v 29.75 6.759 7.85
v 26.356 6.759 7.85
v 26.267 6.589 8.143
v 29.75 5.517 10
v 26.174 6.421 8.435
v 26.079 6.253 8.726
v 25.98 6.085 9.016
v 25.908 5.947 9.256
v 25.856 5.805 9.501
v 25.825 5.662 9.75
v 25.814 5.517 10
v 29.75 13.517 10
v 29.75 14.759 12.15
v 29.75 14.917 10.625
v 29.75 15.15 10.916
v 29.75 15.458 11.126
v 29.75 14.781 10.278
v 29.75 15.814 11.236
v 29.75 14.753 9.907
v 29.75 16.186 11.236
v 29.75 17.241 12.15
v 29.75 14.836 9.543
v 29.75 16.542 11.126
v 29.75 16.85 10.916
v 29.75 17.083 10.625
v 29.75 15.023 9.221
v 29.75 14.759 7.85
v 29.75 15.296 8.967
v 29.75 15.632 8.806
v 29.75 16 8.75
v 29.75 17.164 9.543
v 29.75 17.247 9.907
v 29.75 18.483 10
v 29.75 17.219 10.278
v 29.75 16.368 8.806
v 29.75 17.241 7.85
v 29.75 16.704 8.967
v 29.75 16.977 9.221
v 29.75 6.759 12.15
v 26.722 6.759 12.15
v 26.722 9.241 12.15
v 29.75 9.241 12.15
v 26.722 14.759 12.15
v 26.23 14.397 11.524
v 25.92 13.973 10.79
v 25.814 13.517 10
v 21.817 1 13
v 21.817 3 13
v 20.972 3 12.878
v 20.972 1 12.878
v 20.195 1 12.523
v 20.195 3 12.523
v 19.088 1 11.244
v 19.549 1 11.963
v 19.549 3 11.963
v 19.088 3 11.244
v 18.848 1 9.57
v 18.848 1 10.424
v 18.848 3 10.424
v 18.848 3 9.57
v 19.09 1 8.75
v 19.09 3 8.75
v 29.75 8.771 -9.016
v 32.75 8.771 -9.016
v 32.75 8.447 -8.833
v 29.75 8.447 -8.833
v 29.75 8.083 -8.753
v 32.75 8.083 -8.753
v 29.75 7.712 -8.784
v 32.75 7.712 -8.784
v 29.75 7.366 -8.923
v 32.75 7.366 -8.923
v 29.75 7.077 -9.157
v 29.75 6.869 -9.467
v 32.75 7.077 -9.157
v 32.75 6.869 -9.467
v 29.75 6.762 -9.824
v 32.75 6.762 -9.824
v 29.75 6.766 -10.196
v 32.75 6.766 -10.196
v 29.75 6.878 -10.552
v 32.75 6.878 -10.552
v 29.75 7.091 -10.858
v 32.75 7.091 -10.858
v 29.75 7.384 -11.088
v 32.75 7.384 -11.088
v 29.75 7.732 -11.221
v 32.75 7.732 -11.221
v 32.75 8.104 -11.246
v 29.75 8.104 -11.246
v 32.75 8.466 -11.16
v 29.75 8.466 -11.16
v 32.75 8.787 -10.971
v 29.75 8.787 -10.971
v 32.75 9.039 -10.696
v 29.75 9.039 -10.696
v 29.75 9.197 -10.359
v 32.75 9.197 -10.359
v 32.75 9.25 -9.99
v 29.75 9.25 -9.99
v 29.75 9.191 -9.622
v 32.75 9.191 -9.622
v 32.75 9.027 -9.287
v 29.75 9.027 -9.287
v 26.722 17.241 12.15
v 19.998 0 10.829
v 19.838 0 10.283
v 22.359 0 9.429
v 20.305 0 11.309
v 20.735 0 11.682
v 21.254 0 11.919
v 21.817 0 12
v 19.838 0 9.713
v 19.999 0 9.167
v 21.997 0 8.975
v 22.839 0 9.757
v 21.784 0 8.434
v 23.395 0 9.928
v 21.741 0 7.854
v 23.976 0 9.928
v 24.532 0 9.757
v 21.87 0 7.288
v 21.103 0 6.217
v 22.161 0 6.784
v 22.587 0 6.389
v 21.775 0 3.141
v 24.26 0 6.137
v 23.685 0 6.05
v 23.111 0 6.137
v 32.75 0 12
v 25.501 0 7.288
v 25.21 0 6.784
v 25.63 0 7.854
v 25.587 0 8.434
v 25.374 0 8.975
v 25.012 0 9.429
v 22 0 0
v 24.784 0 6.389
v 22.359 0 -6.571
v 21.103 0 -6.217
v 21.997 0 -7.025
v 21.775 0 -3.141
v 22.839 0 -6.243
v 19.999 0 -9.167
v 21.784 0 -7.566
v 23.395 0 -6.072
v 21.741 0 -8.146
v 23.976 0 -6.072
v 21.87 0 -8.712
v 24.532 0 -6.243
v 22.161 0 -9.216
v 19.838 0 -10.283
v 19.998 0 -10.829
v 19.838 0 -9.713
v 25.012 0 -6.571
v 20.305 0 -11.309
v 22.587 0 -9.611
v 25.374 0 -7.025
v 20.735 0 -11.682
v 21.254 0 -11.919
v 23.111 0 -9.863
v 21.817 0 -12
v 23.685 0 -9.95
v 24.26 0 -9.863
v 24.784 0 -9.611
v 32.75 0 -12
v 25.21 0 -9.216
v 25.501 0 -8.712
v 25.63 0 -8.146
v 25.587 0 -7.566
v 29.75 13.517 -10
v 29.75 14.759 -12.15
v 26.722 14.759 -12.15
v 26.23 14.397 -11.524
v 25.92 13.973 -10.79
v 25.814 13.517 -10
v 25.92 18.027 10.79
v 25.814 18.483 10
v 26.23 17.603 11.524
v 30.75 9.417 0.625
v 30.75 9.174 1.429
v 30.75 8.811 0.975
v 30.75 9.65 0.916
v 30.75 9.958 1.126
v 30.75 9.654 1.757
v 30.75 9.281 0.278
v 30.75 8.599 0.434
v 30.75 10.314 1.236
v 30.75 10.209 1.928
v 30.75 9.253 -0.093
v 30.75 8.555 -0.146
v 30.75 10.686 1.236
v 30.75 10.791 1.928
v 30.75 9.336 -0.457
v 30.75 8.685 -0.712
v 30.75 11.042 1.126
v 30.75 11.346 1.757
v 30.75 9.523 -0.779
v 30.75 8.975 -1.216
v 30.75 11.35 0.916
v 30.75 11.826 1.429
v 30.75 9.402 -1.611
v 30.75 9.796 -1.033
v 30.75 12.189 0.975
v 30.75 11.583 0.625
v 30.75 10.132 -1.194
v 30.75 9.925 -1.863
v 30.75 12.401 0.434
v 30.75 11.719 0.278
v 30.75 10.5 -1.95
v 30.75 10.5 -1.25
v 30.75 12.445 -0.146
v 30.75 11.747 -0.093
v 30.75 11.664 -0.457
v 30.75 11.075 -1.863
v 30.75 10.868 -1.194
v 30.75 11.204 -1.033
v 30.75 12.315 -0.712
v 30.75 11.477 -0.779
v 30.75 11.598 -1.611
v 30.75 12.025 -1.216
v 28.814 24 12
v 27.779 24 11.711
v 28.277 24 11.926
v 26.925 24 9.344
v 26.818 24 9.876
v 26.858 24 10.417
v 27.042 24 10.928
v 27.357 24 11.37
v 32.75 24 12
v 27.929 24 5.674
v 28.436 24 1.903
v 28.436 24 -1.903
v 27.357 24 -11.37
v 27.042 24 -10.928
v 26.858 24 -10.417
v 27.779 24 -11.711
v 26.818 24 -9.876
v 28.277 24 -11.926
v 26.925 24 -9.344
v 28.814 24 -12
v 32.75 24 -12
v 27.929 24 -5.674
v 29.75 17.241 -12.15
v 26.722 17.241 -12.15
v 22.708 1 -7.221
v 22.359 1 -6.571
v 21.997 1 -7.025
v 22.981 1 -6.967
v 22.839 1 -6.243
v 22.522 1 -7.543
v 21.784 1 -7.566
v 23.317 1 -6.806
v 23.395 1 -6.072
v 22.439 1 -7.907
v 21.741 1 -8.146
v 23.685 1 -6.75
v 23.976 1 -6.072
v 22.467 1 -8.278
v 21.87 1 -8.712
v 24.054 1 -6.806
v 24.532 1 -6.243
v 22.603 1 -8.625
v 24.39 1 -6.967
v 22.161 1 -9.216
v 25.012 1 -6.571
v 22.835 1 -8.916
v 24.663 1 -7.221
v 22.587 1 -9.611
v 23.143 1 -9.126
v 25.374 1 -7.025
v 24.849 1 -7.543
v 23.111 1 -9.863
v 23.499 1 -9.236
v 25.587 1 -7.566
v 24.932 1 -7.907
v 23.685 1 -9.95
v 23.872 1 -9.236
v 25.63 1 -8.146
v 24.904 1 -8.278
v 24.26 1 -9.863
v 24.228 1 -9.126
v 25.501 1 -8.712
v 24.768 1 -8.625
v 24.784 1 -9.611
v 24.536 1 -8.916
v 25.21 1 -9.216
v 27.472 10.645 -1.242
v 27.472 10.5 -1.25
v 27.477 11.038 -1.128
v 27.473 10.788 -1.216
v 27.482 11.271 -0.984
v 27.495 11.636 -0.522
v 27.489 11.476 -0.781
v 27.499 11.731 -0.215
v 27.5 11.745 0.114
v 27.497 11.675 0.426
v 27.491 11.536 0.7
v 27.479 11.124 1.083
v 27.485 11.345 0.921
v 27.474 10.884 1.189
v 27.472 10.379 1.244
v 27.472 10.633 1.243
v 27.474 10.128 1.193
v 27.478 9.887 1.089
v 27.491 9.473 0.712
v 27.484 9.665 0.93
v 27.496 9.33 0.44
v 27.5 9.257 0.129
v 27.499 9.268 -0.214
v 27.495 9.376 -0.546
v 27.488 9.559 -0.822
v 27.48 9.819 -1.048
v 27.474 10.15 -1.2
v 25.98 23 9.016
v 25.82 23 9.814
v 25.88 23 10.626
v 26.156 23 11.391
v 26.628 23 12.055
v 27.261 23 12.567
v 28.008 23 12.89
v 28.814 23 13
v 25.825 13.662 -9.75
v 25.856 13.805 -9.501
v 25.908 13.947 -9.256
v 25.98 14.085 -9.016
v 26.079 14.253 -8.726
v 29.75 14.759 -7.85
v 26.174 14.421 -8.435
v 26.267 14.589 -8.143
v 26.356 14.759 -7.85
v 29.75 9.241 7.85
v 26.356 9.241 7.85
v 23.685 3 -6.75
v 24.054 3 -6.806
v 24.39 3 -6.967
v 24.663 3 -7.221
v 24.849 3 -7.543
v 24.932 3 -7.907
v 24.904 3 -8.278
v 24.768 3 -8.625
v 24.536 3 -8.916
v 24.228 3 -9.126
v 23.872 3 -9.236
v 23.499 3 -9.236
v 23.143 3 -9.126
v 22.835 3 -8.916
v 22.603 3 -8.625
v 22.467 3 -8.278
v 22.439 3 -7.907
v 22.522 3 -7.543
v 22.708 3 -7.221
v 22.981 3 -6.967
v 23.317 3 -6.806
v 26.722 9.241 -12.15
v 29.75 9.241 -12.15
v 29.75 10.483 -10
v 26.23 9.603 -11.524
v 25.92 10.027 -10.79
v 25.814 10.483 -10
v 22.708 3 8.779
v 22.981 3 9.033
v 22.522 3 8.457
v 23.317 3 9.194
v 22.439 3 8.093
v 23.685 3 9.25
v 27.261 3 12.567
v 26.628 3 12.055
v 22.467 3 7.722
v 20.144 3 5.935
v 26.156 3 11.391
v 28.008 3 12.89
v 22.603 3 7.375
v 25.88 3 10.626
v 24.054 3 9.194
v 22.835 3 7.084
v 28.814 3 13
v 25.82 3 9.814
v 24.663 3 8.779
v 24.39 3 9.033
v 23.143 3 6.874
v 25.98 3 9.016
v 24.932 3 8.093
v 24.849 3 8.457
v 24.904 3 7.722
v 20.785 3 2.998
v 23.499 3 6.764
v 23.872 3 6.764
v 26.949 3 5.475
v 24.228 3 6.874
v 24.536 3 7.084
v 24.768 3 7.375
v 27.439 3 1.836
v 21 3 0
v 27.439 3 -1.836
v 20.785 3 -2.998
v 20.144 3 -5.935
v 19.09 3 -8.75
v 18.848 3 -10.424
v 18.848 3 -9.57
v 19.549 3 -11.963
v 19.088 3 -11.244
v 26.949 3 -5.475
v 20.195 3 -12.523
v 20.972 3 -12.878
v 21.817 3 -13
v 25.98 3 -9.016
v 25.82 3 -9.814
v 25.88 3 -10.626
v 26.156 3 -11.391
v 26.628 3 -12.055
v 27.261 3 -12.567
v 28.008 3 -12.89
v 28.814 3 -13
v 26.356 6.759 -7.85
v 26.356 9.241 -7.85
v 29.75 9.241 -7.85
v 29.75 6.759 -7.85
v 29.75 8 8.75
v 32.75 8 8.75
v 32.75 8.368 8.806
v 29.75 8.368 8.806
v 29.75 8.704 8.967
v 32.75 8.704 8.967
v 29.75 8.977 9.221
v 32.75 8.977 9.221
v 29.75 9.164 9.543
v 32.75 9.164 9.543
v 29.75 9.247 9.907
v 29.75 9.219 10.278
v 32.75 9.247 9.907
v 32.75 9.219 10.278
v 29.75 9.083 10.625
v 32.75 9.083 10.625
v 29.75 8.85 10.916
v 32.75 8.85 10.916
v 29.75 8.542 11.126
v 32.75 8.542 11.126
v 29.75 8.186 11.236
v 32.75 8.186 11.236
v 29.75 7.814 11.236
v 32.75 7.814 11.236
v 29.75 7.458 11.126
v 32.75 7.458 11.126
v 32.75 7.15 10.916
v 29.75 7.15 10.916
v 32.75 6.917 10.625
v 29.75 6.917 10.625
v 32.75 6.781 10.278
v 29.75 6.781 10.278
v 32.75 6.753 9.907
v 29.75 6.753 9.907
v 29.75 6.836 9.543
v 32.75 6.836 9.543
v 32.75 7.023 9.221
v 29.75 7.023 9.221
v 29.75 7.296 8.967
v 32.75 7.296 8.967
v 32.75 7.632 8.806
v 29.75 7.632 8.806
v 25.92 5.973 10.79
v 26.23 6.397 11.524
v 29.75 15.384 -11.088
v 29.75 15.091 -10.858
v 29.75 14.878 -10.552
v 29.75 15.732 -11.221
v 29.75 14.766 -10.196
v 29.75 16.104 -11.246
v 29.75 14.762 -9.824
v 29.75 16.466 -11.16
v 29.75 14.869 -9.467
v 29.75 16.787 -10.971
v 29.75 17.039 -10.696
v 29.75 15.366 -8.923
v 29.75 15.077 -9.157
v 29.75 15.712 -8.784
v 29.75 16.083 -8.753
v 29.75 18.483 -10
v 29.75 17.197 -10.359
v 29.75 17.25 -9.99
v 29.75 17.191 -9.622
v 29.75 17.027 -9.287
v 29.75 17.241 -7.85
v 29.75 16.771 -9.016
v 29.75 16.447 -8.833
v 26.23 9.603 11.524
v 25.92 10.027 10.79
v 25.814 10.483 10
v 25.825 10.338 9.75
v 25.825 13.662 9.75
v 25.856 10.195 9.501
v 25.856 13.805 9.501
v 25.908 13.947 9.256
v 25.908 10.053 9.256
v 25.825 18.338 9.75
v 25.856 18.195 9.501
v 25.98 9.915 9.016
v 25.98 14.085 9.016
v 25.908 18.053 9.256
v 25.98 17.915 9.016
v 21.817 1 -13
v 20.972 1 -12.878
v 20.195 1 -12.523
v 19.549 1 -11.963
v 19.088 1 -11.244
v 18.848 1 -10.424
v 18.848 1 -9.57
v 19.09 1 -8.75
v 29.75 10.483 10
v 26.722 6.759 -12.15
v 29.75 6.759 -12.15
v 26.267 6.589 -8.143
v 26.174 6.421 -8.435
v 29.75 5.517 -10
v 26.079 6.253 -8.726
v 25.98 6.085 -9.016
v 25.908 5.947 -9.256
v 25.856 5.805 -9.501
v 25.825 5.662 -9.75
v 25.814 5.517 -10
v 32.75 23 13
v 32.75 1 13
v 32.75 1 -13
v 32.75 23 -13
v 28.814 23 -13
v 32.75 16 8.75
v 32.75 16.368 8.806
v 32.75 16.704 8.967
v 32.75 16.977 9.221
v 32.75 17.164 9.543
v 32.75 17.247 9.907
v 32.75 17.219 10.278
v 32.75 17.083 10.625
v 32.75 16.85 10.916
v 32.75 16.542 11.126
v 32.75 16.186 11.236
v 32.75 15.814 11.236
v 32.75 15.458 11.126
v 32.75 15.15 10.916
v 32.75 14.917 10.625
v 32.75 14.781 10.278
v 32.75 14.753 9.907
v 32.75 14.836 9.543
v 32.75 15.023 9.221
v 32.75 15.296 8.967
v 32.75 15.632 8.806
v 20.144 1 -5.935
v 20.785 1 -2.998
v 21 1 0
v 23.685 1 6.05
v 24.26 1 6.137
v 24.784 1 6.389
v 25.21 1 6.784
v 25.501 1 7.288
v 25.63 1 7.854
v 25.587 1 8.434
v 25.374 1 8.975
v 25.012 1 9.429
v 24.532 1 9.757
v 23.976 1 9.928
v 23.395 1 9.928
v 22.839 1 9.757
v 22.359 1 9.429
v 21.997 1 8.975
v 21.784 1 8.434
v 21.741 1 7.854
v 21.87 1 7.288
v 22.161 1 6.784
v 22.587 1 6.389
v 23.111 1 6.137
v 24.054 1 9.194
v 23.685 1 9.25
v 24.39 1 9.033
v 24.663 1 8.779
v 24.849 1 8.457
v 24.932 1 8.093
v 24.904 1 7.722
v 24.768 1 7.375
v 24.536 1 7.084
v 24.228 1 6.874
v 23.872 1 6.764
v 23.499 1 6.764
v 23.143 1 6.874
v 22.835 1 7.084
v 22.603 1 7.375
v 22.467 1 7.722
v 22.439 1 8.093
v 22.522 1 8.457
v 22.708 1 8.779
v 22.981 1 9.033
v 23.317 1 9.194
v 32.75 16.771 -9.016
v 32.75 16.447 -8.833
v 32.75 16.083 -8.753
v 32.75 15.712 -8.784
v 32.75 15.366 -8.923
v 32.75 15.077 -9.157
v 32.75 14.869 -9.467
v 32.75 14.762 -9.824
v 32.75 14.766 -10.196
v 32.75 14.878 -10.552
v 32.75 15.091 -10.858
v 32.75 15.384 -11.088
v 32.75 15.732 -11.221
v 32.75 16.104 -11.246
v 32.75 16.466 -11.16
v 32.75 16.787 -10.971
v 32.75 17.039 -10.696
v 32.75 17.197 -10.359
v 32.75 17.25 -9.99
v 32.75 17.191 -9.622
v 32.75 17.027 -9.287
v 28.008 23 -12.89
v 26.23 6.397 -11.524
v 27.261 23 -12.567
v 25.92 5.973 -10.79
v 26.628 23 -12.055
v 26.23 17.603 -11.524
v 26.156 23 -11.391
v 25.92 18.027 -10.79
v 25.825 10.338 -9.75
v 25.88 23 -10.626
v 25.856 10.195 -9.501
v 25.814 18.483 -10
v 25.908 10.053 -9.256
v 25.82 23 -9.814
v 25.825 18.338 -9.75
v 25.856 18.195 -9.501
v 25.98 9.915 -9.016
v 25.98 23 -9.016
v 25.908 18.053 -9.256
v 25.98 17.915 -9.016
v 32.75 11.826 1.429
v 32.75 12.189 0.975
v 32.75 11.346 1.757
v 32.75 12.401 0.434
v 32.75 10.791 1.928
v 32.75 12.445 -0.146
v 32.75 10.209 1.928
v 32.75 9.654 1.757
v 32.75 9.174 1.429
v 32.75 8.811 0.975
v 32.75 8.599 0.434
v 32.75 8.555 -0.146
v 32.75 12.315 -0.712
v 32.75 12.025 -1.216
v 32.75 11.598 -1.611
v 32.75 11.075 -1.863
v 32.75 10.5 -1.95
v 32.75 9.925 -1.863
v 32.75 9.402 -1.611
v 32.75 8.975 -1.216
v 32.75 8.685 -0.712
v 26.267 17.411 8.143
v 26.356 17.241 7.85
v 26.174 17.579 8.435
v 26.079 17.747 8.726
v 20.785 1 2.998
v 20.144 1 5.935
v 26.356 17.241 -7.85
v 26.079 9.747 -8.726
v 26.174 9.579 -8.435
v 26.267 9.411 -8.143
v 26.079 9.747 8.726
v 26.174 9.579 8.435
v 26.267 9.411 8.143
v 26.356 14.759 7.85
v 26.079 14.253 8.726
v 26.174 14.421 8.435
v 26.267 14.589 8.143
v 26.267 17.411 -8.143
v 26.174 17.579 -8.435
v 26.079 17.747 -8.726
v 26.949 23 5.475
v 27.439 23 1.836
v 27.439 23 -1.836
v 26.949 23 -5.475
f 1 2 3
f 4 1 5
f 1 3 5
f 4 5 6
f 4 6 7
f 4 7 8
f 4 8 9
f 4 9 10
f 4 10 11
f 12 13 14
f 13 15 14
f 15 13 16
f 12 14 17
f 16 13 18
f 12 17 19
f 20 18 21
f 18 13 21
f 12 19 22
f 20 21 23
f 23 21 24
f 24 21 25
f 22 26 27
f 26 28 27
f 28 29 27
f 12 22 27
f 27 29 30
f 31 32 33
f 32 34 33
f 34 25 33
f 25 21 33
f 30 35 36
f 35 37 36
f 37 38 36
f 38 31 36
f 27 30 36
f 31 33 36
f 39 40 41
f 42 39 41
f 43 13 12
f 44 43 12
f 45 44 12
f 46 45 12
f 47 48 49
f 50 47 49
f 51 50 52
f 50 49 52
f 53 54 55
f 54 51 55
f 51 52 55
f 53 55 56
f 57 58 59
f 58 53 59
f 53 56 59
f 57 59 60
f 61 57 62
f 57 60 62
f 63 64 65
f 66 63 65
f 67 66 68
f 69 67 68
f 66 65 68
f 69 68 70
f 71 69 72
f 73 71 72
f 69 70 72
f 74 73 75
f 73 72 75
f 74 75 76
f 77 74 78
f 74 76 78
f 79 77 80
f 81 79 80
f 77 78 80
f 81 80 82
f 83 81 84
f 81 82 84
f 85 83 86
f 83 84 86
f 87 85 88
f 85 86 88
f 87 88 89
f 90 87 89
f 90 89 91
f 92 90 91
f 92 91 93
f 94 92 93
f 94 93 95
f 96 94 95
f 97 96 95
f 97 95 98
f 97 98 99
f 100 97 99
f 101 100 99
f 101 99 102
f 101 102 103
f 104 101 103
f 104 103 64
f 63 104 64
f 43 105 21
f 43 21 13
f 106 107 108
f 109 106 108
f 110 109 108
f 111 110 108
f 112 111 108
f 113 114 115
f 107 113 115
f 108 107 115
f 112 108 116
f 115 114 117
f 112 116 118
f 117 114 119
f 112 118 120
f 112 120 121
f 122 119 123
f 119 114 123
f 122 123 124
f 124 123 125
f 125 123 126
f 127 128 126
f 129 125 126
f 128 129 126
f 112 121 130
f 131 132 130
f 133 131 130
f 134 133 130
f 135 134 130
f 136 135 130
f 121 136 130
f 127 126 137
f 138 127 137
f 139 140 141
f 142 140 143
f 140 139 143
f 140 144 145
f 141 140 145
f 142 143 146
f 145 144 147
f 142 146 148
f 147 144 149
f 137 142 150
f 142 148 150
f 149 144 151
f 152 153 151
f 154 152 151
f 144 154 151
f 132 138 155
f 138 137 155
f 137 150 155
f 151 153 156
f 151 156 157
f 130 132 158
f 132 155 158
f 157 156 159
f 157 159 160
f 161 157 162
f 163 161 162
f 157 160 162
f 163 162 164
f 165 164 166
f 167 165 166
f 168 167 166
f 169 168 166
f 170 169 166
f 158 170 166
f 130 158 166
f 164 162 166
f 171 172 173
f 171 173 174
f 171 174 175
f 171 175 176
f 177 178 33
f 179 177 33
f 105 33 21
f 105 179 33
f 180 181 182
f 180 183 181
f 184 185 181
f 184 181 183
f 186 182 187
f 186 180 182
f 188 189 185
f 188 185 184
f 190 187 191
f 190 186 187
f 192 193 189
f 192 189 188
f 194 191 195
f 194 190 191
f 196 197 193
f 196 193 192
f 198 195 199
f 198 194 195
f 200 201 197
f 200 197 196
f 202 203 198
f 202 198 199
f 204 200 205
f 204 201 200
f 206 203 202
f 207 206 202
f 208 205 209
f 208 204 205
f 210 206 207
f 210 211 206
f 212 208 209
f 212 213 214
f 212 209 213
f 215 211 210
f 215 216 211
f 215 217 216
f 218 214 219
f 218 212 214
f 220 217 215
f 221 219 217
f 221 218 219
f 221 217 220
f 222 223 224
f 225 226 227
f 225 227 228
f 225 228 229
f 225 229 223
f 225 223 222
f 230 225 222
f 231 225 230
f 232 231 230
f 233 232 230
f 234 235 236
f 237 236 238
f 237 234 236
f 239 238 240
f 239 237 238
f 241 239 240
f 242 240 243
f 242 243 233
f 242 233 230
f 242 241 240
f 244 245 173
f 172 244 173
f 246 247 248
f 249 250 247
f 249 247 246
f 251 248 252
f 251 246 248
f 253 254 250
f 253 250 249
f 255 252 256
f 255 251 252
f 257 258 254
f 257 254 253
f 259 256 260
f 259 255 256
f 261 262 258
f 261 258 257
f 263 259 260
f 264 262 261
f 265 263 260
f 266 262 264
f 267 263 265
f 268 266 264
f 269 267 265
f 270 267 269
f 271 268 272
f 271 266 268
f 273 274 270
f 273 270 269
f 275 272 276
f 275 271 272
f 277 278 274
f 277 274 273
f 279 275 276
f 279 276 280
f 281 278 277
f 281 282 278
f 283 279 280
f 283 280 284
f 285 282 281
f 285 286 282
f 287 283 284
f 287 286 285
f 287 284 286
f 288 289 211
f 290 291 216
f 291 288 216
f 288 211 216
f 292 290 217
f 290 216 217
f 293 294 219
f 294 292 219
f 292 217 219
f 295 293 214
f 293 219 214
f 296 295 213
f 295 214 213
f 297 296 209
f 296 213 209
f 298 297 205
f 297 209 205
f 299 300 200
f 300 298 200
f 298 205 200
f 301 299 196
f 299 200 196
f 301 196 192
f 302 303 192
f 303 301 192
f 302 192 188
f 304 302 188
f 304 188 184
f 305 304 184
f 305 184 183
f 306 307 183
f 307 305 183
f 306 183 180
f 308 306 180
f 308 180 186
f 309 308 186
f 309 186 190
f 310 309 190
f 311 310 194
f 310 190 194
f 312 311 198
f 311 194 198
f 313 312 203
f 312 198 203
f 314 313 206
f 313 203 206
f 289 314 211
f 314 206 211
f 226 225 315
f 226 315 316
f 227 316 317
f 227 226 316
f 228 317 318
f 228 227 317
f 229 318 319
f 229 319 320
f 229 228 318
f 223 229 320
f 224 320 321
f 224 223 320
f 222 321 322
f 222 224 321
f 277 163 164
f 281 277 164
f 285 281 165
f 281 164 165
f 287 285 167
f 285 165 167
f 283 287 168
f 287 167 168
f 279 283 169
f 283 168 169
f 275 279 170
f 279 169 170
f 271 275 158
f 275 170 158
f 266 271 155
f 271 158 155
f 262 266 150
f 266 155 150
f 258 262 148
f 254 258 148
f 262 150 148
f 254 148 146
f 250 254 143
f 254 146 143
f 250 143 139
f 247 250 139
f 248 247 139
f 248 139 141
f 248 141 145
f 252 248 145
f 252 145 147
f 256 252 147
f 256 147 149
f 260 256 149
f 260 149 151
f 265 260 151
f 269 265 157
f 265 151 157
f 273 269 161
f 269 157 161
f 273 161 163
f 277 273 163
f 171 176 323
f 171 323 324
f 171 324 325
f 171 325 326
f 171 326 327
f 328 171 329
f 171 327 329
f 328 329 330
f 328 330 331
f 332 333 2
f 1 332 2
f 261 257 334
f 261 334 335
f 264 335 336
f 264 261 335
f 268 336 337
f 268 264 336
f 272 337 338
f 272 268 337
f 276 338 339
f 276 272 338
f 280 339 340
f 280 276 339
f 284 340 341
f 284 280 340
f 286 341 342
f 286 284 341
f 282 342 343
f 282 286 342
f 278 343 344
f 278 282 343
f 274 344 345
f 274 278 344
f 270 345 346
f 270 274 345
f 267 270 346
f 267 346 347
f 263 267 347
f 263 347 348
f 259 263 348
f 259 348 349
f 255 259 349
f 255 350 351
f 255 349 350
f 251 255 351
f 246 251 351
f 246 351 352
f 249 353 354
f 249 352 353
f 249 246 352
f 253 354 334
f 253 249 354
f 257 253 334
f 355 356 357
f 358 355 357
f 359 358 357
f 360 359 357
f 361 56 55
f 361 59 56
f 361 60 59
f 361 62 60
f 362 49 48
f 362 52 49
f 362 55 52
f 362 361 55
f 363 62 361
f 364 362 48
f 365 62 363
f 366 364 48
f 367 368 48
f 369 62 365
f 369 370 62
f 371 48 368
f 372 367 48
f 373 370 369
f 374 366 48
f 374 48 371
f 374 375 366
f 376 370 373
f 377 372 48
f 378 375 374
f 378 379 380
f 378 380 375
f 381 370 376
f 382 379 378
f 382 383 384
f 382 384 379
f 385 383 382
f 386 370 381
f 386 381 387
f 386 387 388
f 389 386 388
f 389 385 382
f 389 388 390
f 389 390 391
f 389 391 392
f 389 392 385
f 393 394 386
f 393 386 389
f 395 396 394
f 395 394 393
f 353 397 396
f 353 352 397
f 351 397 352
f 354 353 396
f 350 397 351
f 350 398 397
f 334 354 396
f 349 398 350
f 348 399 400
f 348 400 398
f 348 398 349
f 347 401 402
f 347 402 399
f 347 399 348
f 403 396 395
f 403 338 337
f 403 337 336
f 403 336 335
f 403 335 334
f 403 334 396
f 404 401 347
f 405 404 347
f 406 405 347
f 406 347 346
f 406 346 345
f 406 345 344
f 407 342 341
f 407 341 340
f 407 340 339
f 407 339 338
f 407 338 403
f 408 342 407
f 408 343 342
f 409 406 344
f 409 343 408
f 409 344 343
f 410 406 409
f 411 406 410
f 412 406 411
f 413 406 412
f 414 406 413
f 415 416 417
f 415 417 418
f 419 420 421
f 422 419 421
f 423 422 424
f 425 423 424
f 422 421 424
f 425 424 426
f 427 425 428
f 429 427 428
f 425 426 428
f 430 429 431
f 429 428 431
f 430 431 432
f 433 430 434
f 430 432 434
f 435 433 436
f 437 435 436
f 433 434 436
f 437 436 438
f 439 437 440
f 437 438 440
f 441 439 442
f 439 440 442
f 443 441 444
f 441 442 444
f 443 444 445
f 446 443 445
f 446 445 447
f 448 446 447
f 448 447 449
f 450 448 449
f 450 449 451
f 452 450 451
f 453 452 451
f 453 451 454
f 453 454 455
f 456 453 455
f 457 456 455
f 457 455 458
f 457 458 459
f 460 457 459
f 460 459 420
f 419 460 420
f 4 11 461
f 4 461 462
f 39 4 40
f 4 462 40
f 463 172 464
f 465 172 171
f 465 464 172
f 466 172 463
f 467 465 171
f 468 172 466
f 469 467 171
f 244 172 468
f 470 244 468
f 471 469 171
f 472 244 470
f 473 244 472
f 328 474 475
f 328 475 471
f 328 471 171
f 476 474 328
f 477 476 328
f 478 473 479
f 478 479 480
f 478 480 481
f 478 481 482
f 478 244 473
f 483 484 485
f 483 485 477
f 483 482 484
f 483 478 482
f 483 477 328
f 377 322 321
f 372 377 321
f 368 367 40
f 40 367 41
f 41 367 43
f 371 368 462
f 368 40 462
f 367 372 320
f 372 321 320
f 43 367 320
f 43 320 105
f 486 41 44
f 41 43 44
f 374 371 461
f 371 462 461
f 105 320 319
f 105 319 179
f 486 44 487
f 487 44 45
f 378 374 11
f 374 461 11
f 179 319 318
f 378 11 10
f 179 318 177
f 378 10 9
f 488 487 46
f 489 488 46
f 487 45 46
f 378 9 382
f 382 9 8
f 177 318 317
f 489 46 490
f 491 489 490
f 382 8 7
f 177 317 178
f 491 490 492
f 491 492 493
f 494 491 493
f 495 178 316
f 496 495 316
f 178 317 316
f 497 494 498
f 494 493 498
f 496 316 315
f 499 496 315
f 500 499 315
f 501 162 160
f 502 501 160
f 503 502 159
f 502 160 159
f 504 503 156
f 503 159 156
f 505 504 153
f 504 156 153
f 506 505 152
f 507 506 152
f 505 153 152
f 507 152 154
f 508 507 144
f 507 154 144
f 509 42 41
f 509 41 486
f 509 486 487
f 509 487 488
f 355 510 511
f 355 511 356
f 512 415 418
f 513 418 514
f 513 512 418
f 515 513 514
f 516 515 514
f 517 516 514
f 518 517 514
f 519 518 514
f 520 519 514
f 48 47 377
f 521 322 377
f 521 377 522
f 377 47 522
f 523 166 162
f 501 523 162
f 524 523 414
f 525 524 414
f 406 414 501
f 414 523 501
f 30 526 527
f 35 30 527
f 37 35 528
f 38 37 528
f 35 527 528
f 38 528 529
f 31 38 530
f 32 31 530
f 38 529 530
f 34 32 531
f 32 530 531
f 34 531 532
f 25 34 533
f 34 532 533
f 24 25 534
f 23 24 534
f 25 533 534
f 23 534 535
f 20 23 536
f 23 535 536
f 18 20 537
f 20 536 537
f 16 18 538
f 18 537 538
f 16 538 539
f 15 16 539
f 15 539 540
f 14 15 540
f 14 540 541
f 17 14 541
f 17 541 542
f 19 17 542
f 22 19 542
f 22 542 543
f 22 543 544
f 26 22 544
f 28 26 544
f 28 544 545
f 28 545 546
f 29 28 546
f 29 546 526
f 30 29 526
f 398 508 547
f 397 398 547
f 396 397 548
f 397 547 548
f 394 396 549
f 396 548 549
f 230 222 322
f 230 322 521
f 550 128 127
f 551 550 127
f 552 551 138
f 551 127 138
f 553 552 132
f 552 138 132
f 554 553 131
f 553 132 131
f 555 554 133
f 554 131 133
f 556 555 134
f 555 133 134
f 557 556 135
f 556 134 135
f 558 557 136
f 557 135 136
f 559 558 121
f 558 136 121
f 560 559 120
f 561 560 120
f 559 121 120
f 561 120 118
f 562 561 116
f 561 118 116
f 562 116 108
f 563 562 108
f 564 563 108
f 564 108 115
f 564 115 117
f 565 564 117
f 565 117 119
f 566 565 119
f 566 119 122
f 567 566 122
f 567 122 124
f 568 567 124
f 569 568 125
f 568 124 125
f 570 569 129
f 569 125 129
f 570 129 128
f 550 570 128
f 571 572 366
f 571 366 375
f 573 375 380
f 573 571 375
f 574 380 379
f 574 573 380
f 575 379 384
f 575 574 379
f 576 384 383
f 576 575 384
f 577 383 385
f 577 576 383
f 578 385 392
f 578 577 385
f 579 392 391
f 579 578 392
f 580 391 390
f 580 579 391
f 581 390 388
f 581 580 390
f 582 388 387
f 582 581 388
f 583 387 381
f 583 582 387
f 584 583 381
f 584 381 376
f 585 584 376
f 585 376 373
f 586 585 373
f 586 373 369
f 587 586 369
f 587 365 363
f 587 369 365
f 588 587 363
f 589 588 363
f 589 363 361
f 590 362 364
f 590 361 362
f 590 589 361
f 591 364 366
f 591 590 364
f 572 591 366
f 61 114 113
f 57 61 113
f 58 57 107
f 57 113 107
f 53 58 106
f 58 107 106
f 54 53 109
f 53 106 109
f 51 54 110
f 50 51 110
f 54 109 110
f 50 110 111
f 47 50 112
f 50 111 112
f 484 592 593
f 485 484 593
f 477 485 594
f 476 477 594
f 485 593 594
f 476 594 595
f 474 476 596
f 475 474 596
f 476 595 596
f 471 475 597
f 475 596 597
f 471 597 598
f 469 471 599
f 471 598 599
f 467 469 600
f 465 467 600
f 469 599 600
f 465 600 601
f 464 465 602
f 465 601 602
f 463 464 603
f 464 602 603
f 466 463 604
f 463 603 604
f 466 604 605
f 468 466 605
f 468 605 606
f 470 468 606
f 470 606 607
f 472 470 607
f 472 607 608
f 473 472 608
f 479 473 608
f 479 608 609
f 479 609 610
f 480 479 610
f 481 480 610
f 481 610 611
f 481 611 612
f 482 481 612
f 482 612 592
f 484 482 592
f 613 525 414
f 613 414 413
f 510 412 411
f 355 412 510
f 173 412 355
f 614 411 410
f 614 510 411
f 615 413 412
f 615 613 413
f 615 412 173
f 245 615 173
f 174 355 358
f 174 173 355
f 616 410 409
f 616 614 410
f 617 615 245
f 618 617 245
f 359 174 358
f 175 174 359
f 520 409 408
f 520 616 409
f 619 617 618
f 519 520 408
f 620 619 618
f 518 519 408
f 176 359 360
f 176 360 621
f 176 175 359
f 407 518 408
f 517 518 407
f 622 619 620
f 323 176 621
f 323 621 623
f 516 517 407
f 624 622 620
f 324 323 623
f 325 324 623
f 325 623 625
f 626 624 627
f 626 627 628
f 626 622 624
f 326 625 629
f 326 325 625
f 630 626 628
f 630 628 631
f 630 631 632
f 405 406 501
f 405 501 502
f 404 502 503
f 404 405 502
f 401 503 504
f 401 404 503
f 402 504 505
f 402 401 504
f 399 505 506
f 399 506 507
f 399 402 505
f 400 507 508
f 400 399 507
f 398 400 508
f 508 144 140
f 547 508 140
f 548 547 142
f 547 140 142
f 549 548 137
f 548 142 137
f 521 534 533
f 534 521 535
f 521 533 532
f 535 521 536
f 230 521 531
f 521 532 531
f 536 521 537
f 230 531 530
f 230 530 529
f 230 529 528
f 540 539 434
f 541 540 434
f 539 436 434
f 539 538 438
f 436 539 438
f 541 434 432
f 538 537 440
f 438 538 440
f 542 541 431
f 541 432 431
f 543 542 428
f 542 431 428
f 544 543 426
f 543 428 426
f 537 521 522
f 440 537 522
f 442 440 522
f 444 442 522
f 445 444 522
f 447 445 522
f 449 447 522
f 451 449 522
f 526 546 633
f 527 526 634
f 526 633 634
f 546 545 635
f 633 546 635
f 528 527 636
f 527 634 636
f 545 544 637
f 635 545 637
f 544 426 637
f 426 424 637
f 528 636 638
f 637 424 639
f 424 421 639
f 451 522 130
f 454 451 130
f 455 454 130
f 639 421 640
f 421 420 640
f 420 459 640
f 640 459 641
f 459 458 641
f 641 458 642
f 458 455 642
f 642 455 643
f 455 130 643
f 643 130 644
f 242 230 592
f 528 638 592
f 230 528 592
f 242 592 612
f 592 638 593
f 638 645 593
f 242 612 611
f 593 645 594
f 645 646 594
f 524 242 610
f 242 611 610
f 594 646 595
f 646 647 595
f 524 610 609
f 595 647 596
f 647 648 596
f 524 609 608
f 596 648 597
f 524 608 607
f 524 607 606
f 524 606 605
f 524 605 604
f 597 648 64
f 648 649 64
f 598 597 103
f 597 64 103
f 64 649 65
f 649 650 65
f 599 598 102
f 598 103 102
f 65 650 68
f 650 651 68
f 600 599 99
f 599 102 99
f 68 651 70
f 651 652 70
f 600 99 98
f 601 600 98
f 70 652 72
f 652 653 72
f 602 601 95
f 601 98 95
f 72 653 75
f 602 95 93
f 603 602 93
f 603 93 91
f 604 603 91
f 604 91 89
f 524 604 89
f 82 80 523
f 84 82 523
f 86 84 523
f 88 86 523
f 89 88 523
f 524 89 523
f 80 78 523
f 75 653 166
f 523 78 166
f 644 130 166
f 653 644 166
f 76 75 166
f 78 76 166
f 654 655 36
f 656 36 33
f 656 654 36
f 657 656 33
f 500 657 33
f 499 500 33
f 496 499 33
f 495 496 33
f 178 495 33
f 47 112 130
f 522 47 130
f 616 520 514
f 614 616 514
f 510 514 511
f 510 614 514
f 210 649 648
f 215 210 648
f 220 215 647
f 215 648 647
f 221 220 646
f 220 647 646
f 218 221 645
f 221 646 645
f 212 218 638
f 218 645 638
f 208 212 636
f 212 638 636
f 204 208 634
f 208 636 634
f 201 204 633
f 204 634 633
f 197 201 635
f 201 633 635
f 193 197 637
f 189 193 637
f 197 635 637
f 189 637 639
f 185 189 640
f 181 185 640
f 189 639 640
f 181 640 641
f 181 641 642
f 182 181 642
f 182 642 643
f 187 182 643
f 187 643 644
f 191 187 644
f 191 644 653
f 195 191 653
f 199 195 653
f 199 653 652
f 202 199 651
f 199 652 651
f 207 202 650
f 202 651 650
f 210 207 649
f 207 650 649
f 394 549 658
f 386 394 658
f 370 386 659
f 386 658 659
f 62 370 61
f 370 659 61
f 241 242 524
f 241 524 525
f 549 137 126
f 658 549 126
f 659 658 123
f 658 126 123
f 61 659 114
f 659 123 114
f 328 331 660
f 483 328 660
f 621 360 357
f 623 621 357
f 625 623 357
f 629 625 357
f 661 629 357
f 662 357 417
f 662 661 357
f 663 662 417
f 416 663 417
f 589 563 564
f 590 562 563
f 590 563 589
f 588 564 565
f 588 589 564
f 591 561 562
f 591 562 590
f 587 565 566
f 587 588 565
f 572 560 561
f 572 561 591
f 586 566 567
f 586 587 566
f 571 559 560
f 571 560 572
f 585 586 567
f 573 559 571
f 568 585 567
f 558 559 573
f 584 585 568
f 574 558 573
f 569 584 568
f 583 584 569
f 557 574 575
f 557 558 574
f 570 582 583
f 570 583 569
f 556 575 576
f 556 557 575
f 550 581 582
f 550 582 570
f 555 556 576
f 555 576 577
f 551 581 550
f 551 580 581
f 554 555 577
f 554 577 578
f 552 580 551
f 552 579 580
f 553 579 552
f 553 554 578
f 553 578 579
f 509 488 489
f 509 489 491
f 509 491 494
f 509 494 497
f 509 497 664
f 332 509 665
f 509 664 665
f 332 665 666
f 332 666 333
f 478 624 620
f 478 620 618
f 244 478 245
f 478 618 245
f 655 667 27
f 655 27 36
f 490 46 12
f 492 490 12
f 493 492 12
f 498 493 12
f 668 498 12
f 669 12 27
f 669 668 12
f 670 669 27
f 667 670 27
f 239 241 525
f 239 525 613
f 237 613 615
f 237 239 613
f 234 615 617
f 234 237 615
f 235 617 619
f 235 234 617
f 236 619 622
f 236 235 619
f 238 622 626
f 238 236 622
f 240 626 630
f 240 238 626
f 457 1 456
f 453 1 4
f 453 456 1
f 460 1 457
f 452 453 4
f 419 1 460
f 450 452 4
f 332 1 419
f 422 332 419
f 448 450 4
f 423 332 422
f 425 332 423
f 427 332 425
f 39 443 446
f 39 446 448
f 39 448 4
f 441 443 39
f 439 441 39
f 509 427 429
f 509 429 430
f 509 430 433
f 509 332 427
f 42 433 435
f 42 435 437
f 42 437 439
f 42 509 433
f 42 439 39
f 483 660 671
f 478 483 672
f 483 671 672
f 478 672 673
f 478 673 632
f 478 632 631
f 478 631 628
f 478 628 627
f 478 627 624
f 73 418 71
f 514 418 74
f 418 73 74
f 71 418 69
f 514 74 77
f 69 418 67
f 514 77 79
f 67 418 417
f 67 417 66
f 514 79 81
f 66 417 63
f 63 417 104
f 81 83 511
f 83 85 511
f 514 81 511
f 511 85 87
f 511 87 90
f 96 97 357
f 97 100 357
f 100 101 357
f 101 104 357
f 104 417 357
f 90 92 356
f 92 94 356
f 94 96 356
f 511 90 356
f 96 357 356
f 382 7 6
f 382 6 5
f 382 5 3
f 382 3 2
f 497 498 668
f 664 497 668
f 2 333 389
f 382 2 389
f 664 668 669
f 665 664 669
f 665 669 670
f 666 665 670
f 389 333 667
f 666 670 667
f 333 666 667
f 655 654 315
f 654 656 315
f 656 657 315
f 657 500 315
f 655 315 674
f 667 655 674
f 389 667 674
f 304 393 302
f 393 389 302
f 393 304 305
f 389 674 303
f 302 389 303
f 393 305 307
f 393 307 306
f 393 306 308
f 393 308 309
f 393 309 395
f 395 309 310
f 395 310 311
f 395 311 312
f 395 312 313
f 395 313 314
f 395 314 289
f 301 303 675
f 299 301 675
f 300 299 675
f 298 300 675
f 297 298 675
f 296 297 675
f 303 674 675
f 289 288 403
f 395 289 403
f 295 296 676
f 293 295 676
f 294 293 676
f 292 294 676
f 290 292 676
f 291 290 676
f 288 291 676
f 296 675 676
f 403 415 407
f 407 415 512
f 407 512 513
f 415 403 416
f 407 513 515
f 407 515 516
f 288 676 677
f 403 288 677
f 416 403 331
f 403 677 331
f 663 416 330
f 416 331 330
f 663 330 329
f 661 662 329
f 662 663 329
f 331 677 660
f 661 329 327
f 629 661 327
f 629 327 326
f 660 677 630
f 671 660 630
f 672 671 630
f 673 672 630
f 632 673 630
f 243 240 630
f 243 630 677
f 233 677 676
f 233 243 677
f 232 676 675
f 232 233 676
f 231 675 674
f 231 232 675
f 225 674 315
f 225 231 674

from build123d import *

# Parameters (mm, degrees)
SKETCH_1_R          = 1.25
EXTRUDE_1_DEPTH     = 24
SKETCH_2_R          = 27.5
CUT_EXTRUDE_1_DEPTH = 21
FILLET_1_R          = 3
SKETCH_3_R          = 1.25
CUT_EXTRUDE_2_DEPTH = 31.645010485
CHAMFER_2_SIZE      = 1
CUT_EXTRUDE_3_DEPTH = 29.75
SKETCH_5_R          = 1.95
CUT_EXTRUDE_4_DEPTH = 2
SKETCH_6_R          = 1.95
CUT_EXTRUDE_5_DEPTH = 1


with BuildPart() as part:
    # Эскиз1 → Бобышка-Вытянуть1 (new body)
    with BuildSketch(Plane(origin=(0, 0, 0), x_dir=(1, 0, 0), z_dir=(0, 1, 0))):
        with BuildLine():
            Line((32.75, 13), (16.492422502, 13))
            ThreePointArc((16.492422502, 13), (19.841129914, 6.879648517), (21, 0))
            ThreePointArc((21, 0), (19.841129914, -6.879648517), (16.492422502, -13))
            Line((16.492422502, -13), (32.75, -13))
            Line((32.75, -13), (32.75, 13))
        make_face()
        with Locations(Location((23.685438565, -8, 0), (0, 0, 270))):
            Circle(SKETCH_1_R, mode=Mode.SUBTRACT)
        with Locations(Location((23.685438565, 8, 0), (0, 0, 270))):
            Circle(SKETCH_1_R, mode=Mode.SUBTRACT)
    extrude(amount=EXTRUDE_1_DEPTH)

    # Эскиз2 → Вырез-Вытянуть1 (cut)
    with BuildSketch(Plane(origin=(0, 24, 0), x_dir=(1, 0, 0), z_dir=(0, 1, 0))):
        Circle(SKETCH_2_R)
    extrude(amount=-CUT_EXTRUDE_1_DEPTH, mode=Mode.SUBTRACT)

    # Скругление1
    fillet_1_edges = [part.edges().sort_by_distance(p)[0] for p in [
        (16.492422502, 1.5, -13),
        (16.492422502, 1.5, 13),
        (24.233241632, 13.5, 13),
        (24.233241632, 13.5, -13),
    ]]
    fillet(fillet_1_edges, radius=FILLET_1_R)

    # Эскиз3 → Вырез-Вытянуть2 (cut, through all)
    with BuildSketch(Plane(origin=(32.75, 0, 0), x_dir=(0, 0, -1), z_dir=(1, 0, 0))):
        with Locations((0, 10.5)):
            Circle(SKETCH_3_R)
        with Locations((-10, 16)):
            Circle(SKETCH_3_R)
        with Locations((-10, 8)):
            Circle(SKETCH_3_R)
        with Locations(Location((10, 8, 0), (0, 0, 141.895375662))):
            Circle(SKETCH_3_R)
        with Locations(Location((10, 16, 0), (0, 0, 141.895375662))):
            Circle(SKETCH_3_R)
    extrude(amount=-CUT_EXTRUDE_2_DEPTH, mode=Mode.SUBTRACT)

    # Фаска2
    chamfer_2_edges = [part.edges().sort_by_distance(p)[0] for p in [
        (30.782029534, 24, 13),
        (27.283712115, 0, 13),
        (27.5, 24, 0),
        (30.782029534, 24, -13),
        (26.369593925, 24, -11.73913489),
        (26.369593925, 24, 11.73913489),
        (27.283712115, 0, -13),
        (21, 0, 0),
        (19.292547995, 0, 11.620185175),
        (19.292547995, 0, -11.620185175),
    ]]
    chamfer(chamfer_2_edges, length=CHAMFER_2_SIZE)

    # Эскиз4 → Вырез-Вытянуть3 (cut)
    with BuildSketch(Plane(origin=(0, 0, 0), x_dir=(0, 0, -1), z_dir=(1, 0, 0))):
        Polygon((-7.85, 14.758696921), (-7.85, 17.241303079), (-10, 18.482606158), (-12.15, 17.241303079), (-12.15, 14.758696921), (-10, 13.517393842), align=None)
        Polygon((-10, 10.482606158), (-7.85, 9.241303079), (-7.85, 6.758696921), (-10, 5.517393842), (-12.15, 6.758696921), (-12.15, 9.241303079), align=None)
        Polygon((7.85, 9.241303079), (7.85, 6.758696921), (10, 5.517393842), (12.15, 6.758696921), (12.15, 9.241303079), (10, 10.482606158), align=None)
        Polygon((10, 13.517393842), (7.85, 14.758696921), (7.85, 17.241303079), (10, 18.482606158), (12.15, 17.241303079), (12.15, 14.758696921), align=None)
    extrude(amount=CUT_EXTRUDE_3_DEPTH, mode=Mode.SUBTRACT)

    # Эскиз5 → Вырез-Вытянуть4 (cut)
    with BuildSketch(Plane(origin=(32.75, 0, 0), x_dir=(0, 0, -1), z_dir=(1, 0, 0))):
        with Locations((0, 10.5)):
            Circle(SKETCH_5_R)
    extrude(amount=-CUT_EXTRUDE_4_DEPTH, mode=Mode.SUBTRACT)

    # Эскиз6 → Вырез-Вытянуть5 (cut)
    with BuildSketch(Plane.XZ):
        with Locations(Location((23.685438565, 8, 0), (0, 0, 270))):
            Circle(SKETCH_6_R)
        with Locations(Location((23.685438565, -8, 0), (0, 0, 270))):
            Circle(SKETCH_6_R)
    extrude(amount=-CUT_EXTRUDE_5_DEPTH, mode=Mode.SUBTRACT)


solid = part.part
